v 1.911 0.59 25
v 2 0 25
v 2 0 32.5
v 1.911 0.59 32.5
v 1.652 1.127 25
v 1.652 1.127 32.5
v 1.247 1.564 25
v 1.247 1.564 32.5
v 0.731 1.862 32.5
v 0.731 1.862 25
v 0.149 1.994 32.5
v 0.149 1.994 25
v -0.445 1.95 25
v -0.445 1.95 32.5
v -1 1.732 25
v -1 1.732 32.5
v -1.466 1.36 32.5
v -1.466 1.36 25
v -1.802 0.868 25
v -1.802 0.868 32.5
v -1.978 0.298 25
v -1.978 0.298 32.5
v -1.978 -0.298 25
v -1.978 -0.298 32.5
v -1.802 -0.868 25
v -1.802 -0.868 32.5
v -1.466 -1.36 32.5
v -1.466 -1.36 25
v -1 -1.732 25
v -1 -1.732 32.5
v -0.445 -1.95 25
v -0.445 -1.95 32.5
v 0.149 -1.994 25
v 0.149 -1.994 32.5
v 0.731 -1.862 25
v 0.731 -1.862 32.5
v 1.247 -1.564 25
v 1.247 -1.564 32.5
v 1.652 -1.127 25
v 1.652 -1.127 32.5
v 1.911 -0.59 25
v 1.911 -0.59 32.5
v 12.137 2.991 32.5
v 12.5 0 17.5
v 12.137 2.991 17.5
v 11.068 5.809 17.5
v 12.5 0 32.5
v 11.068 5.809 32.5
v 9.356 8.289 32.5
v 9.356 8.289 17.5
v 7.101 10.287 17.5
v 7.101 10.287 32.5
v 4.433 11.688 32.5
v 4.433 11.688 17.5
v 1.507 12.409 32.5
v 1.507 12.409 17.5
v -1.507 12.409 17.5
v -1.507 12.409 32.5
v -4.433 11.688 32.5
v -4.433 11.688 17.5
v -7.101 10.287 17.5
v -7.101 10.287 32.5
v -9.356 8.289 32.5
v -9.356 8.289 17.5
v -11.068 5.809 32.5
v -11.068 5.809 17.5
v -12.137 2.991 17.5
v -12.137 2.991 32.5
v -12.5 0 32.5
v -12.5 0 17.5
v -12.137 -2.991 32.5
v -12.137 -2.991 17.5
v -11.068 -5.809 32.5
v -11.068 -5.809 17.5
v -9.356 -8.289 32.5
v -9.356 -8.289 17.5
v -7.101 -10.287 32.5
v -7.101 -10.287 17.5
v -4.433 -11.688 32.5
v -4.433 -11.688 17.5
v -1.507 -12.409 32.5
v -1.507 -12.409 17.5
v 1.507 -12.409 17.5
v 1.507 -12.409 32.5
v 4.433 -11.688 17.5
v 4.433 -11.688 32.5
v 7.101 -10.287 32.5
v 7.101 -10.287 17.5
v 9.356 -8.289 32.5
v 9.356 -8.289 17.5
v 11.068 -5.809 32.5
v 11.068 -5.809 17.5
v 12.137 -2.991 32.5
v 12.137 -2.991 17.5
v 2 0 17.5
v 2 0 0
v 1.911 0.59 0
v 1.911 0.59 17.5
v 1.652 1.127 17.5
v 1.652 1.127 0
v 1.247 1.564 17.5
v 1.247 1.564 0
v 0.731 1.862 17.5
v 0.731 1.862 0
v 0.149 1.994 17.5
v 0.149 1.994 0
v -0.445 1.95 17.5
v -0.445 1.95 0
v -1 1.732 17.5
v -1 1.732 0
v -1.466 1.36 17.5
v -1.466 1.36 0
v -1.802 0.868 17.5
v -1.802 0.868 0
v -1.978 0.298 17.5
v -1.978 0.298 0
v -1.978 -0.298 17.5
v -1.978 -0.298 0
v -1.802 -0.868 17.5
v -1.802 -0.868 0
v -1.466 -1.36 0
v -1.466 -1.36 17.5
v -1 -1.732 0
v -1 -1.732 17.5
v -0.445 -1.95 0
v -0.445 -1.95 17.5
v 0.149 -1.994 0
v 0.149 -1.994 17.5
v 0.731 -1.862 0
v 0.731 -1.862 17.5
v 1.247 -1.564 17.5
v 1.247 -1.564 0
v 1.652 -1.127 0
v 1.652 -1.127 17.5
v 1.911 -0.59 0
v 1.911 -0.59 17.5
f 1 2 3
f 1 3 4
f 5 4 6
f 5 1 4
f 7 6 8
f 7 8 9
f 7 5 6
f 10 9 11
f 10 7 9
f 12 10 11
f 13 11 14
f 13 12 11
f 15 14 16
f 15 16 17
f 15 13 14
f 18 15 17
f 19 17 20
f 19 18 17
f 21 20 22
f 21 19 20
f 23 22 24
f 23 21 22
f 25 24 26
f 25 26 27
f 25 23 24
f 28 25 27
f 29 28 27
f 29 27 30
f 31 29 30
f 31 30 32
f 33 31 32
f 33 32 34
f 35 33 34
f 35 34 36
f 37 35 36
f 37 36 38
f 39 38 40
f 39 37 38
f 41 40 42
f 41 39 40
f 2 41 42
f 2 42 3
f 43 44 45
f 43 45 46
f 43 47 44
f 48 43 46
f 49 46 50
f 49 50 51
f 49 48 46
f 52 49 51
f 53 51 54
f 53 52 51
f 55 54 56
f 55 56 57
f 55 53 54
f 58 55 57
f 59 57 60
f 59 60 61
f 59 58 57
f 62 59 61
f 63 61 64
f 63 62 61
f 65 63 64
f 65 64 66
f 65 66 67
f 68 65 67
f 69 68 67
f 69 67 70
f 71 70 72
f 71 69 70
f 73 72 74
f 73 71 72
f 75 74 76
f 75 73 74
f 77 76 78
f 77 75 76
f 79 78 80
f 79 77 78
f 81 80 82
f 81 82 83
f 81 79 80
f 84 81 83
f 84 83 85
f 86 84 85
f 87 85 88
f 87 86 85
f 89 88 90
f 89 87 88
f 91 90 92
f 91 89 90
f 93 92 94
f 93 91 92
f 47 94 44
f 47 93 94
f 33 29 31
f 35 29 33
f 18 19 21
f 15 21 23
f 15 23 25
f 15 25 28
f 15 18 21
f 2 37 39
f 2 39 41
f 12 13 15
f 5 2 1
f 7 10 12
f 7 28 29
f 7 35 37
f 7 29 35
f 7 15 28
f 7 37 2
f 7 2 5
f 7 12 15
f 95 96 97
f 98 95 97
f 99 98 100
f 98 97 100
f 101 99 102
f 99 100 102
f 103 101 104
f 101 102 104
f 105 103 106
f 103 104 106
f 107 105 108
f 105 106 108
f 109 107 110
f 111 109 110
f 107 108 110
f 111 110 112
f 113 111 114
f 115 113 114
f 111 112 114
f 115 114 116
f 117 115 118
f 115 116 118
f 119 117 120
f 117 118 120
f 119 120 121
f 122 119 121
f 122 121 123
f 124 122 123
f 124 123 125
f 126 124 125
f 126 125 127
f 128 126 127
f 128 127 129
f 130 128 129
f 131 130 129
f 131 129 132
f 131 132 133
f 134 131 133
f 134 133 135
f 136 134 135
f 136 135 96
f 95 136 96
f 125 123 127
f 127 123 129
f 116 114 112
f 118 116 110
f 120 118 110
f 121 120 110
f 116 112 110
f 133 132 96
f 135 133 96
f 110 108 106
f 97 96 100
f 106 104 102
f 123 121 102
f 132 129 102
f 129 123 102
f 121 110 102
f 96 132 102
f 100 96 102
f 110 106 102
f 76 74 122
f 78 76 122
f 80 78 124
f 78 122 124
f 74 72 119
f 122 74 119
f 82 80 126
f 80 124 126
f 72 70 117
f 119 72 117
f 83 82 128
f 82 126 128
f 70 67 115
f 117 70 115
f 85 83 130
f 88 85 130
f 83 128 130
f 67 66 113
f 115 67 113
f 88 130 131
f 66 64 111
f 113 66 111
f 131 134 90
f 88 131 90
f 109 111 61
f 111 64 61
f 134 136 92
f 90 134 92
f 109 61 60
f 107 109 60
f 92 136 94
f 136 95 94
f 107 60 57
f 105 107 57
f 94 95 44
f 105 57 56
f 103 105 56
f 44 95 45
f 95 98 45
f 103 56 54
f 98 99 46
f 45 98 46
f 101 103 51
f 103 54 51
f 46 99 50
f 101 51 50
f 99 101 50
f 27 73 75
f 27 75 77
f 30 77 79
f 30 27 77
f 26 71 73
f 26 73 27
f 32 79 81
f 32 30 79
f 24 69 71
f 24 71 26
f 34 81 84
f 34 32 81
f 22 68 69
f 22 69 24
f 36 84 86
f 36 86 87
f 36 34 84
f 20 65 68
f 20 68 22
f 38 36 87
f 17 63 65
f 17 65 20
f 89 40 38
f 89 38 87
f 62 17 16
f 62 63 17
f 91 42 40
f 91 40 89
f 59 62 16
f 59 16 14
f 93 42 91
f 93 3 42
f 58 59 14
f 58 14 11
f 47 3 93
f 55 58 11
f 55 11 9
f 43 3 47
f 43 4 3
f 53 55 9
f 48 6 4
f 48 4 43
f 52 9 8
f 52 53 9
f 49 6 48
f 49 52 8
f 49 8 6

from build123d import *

# Parameters (mm, degrees)
F0_R     = 2
F1_DEPTH = 25
F2_R     = 12.5
F2_R_2   = 2
F3_DEPTH = 7.5


with BuildPart() as f1:
    # F0 (on Top) → F1 (new body)
    with BuildSketch(Plane.XY):
        Circle(F0_R)
    extrude(amount=F1_DEPTH)

    # F2 (on face) → F3 (join, symmetric)
    with BuildSketch(Plane.XY.offset(25)):
        Circle(F2_R)
        Circle(F2_R_2, mode=Mode.SUBTRACT)
    extrude(amount=F3_DEPTH, both=True)


solid = f1.part
